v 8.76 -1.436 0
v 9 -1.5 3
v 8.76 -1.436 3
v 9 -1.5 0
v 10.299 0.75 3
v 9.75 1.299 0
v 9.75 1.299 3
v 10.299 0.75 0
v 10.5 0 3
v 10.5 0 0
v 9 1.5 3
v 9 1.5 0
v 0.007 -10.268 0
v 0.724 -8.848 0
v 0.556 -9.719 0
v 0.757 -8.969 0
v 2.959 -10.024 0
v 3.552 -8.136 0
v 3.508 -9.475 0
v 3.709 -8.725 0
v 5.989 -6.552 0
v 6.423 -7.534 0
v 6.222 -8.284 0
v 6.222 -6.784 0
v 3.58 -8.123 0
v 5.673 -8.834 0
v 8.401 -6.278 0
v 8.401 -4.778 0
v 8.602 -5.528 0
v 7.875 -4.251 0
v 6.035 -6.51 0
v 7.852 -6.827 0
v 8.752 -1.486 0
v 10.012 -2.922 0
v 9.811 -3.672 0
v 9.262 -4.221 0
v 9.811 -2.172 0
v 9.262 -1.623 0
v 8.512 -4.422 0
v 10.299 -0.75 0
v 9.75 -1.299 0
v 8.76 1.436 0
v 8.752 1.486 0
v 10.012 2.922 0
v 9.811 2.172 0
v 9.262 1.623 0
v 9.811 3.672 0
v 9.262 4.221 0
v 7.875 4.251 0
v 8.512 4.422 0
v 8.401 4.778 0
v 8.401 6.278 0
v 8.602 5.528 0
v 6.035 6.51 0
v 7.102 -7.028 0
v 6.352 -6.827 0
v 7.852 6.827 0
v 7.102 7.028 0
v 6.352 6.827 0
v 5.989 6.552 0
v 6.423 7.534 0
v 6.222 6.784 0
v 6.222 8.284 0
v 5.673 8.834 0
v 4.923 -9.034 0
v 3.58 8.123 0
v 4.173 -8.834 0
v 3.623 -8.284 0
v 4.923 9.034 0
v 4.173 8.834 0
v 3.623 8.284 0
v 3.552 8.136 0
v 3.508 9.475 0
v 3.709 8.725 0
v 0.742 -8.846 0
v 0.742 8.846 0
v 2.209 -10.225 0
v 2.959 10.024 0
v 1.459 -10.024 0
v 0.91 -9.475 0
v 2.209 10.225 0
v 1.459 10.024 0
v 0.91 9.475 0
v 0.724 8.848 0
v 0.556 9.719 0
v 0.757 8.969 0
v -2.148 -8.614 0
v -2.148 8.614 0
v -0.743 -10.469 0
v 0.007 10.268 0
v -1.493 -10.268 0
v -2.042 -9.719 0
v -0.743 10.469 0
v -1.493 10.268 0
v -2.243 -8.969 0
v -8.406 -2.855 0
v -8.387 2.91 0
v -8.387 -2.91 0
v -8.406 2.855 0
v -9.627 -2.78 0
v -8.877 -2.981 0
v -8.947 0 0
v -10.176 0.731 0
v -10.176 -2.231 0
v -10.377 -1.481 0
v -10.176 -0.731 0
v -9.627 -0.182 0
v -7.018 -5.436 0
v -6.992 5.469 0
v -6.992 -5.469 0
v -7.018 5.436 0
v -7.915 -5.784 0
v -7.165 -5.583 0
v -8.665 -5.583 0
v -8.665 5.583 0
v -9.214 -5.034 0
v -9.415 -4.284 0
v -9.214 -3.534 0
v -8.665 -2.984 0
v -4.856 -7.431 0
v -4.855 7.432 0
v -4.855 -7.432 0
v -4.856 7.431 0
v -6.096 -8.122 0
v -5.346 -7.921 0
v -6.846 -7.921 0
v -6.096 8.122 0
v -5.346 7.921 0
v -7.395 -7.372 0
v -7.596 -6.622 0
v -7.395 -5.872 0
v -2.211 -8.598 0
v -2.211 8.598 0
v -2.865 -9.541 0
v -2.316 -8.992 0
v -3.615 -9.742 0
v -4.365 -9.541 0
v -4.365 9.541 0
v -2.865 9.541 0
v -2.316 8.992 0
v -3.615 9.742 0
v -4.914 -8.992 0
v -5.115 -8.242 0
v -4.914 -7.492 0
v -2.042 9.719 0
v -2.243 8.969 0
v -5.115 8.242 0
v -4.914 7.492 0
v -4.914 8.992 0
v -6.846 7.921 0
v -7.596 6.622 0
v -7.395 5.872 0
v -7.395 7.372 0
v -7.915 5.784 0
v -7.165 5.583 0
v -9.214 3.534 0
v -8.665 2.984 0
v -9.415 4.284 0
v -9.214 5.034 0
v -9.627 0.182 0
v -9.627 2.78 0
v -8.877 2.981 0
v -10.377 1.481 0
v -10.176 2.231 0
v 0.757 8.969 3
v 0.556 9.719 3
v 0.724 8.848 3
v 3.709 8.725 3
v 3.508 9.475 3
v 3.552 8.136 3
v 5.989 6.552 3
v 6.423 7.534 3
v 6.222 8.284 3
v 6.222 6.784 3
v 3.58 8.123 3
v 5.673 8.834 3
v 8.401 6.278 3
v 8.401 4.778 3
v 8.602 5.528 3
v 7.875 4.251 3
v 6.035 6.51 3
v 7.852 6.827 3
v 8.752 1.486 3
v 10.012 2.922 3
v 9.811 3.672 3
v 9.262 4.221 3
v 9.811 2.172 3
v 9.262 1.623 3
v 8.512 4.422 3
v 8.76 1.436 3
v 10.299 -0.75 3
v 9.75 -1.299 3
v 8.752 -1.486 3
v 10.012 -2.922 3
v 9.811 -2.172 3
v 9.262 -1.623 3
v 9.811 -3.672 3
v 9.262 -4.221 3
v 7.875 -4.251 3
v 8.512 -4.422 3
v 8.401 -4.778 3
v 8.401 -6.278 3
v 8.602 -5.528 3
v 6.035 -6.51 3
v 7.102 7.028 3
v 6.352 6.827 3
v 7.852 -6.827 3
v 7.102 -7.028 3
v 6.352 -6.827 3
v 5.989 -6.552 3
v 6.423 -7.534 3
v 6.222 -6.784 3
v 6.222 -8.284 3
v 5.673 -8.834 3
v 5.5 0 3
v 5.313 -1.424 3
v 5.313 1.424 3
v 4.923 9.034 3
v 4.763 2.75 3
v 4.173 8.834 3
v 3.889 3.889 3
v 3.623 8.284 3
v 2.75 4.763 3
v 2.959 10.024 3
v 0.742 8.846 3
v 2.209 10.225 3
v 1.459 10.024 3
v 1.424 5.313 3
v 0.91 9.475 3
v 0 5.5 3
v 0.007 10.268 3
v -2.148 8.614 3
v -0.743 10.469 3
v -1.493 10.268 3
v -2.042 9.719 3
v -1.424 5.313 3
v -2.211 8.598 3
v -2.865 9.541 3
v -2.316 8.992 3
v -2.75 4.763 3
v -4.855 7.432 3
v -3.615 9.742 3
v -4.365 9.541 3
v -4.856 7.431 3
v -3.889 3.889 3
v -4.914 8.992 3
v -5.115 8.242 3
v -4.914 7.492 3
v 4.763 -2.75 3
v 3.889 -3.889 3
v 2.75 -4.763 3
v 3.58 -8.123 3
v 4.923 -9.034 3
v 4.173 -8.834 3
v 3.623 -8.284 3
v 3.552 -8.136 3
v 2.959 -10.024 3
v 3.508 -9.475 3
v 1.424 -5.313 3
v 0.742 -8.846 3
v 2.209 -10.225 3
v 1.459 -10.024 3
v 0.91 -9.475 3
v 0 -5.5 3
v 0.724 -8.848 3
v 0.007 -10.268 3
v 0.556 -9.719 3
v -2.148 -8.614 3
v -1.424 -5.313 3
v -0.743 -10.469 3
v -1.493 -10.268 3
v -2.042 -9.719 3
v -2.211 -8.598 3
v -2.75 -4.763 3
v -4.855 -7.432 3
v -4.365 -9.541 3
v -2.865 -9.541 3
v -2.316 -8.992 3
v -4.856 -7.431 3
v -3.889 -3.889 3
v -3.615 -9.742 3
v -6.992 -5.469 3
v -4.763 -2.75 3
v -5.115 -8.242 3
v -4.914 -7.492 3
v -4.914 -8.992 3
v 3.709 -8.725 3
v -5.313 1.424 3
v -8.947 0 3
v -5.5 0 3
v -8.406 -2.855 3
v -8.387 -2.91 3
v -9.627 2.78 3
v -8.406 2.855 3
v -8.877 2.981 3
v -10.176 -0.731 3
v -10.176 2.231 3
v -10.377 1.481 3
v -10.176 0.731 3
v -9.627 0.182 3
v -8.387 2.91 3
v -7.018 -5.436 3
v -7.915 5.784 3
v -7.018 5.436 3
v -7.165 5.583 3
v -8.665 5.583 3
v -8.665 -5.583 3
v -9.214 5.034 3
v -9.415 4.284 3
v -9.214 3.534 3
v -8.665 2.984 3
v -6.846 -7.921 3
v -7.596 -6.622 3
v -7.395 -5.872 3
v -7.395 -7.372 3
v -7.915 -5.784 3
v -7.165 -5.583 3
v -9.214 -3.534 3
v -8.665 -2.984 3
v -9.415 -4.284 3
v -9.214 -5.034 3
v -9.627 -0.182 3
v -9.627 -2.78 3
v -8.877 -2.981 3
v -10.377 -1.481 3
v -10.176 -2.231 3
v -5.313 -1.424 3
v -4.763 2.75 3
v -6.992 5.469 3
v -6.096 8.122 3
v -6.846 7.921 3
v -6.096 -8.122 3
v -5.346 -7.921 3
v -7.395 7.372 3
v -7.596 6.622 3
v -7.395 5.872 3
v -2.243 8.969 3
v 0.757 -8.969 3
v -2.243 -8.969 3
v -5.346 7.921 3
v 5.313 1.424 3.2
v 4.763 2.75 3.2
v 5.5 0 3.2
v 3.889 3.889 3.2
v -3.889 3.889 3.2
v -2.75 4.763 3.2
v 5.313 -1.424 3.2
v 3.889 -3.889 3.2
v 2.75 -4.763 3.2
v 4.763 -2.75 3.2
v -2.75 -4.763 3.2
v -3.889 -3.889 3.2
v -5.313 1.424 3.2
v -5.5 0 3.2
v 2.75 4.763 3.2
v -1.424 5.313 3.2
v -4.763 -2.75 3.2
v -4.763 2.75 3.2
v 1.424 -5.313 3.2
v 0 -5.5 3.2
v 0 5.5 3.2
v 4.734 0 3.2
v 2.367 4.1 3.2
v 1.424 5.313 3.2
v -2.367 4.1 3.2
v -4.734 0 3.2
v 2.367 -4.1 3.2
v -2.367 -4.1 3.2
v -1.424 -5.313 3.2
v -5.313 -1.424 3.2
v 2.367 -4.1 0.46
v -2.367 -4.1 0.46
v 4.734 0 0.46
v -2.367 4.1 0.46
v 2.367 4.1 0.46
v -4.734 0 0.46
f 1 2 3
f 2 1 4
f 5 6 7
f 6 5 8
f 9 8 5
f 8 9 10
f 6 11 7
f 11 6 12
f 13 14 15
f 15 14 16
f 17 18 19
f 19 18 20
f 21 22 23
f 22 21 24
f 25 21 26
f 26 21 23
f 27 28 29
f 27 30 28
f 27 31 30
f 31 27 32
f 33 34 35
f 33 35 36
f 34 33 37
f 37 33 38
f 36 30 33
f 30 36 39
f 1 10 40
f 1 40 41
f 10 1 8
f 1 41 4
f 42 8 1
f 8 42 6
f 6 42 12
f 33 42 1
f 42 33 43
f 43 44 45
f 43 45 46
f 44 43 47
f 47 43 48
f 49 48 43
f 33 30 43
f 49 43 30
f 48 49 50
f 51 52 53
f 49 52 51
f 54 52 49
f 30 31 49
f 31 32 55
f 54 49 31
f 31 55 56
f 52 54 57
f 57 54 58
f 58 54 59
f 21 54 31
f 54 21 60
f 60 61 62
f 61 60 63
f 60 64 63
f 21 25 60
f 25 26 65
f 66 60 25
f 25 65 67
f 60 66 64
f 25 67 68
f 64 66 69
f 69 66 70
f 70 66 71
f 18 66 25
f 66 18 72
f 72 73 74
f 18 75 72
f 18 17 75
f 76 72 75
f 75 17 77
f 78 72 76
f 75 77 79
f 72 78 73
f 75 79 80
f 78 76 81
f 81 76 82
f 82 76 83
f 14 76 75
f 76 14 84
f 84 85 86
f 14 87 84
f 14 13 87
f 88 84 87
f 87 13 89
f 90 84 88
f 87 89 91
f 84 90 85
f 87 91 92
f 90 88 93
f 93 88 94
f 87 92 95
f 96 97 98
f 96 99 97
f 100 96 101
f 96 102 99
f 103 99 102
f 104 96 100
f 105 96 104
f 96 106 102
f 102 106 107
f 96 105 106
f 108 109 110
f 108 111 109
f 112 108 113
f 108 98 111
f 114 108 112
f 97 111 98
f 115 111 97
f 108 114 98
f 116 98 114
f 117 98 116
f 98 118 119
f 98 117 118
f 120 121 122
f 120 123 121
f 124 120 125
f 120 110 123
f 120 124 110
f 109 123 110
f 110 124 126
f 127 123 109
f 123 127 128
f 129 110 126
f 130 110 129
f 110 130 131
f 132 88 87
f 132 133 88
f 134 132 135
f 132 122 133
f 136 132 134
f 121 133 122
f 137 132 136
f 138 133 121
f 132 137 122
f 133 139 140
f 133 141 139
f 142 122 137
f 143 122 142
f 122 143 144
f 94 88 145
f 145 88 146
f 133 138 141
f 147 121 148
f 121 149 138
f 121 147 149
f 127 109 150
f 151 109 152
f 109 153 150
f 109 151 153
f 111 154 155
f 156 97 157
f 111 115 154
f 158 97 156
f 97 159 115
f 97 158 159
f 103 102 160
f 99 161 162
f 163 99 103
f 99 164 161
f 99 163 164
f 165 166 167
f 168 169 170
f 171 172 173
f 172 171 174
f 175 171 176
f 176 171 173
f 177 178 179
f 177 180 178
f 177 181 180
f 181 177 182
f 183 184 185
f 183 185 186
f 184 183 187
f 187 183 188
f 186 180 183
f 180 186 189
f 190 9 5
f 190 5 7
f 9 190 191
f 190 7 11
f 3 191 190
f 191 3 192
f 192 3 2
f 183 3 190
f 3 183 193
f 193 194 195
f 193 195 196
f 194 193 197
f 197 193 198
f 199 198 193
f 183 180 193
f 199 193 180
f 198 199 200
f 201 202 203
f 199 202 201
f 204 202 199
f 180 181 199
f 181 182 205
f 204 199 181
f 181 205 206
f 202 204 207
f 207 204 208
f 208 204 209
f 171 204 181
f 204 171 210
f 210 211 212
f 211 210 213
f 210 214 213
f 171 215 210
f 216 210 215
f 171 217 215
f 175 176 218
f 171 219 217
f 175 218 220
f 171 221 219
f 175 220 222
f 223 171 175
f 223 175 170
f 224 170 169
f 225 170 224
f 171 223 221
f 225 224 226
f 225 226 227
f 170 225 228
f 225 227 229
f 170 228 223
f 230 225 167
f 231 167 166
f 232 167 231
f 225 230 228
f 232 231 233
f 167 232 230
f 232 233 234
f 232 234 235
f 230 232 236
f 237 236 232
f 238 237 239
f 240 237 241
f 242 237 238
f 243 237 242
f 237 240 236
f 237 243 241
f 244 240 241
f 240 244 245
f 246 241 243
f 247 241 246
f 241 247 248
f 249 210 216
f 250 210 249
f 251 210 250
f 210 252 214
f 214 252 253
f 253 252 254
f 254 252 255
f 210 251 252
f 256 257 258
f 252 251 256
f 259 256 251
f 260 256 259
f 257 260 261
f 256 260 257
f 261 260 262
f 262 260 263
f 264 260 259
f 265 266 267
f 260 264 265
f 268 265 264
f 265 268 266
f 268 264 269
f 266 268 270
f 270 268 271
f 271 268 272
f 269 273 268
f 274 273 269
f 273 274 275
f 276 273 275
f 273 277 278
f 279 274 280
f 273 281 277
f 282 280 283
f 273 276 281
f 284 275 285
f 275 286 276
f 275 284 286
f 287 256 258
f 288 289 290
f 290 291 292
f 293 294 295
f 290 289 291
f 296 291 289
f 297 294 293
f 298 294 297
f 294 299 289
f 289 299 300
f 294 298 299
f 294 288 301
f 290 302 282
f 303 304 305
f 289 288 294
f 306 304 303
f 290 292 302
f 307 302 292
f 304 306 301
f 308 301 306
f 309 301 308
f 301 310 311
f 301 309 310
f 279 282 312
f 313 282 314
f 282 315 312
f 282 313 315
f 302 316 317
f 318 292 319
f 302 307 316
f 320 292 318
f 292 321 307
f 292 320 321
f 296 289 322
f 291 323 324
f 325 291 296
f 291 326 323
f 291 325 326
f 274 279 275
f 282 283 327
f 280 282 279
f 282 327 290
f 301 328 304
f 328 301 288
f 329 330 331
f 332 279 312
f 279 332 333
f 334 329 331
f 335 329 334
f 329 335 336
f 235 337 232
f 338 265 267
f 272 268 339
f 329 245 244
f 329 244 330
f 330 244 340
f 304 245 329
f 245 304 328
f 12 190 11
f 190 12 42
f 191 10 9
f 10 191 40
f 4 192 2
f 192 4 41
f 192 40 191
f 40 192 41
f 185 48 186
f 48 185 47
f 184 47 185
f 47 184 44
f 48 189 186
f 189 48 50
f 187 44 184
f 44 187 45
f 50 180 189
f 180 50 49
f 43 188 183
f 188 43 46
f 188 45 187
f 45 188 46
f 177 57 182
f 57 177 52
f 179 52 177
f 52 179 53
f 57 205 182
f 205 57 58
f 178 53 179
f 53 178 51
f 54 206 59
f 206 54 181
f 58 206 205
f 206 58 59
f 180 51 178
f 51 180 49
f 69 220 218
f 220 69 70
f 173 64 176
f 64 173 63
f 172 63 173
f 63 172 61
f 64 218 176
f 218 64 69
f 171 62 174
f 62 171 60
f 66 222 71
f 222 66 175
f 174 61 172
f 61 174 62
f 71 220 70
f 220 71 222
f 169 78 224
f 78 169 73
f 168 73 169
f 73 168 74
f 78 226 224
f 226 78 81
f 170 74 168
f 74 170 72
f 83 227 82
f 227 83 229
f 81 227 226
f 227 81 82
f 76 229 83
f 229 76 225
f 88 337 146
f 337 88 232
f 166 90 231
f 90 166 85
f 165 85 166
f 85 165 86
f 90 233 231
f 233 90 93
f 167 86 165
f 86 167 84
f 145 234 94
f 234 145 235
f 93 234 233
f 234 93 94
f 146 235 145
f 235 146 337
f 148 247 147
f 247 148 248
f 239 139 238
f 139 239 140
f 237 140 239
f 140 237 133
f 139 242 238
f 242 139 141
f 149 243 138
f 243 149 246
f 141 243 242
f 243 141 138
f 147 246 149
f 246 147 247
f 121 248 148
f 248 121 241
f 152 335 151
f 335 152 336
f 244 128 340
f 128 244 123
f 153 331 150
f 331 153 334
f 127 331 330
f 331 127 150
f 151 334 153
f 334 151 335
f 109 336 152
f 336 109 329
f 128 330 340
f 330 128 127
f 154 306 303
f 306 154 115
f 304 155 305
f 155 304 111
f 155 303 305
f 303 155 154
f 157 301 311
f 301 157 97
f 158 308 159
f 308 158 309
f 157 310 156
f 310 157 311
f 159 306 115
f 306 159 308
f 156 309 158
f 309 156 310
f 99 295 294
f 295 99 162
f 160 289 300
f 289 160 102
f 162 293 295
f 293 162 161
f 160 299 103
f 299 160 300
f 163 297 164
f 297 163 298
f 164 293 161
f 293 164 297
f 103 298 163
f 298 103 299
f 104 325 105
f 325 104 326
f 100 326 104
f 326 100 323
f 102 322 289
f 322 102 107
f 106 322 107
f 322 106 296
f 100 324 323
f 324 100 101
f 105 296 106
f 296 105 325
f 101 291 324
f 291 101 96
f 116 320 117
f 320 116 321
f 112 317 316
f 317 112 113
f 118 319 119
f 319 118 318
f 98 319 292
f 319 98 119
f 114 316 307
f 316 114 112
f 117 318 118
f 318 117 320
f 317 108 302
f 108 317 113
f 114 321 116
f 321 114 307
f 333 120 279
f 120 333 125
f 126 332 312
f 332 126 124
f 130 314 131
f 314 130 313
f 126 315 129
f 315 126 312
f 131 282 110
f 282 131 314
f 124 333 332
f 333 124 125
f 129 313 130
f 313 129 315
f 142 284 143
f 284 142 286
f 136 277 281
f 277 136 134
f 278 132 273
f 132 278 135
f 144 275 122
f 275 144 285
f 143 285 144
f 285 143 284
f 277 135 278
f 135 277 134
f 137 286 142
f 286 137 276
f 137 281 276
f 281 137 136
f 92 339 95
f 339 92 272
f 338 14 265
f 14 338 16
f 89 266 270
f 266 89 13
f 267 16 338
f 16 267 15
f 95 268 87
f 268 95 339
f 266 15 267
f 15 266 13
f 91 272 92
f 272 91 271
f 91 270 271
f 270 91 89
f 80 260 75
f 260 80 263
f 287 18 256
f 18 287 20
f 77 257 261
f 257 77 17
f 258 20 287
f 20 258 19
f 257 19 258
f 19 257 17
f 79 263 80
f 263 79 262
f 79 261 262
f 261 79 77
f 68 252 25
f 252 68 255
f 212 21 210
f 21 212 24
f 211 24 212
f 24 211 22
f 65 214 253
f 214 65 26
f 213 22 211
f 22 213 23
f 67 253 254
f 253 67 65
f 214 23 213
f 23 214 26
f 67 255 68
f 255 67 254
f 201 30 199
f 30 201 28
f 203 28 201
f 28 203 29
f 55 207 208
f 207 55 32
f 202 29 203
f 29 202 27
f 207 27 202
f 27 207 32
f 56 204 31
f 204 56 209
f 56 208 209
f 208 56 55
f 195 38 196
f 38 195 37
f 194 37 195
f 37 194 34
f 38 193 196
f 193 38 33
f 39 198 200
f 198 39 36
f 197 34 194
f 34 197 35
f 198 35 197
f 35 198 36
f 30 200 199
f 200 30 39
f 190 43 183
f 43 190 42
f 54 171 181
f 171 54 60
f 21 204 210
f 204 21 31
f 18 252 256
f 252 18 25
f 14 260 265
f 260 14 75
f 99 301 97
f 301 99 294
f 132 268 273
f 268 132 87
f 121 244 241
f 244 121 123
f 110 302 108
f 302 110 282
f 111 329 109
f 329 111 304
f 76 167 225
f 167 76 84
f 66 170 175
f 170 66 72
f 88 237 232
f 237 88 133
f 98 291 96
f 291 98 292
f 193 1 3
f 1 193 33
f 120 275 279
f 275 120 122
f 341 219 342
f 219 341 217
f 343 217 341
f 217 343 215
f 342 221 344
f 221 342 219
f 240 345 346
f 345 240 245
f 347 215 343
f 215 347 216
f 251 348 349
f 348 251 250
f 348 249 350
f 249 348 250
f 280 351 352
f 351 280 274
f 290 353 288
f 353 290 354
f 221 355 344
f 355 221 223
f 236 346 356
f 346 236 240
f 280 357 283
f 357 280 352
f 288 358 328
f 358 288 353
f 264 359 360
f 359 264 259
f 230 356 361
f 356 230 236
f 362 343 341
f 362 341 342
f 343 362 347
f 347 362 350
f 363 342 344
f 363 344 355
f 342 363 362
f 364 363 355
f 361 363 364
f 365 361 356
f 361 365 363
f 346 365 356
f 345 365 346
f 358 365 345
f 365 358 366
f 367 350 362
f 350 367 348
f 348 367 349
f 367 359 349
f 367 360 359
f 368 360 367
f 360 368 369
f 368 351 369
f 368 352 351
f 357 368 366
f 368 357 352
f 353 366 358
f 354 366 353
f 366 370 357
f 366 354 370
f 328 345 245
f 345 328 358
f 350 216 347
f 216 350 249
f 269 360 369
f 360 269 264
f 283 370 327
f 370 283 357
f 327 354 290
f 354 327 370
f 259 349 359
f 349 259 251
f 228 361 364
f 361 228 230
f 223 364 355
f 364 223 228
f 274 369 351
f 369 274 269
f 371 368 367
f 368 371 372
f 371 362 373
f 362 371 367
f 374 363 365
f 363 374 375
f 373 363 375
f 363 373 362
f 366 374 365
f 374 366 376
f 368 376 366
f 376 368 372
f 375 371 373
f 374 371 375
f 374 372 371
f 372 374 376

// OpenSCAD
height = 3.2;
thick_height = 3;
diameter = 11;
thick_diameter = 18;

hole_diameter_tolerance = 0;
hole_diameter_base_size = 0;
nut_thickness = 2.74;
nut_width_tolerance = 0.35;
nut_width_base_size = 7.85;

module dummy() {}

hole_diameter = hole_diameter_base_size + hole_diameter_tolerance;
nut_width = nut_width_base_size + nut_width_tolerance;

nudge = 0.001;

pi = 3.141592653589793;

module knurledCylinder(h=10,r1=5,r2=1.5) {
    n = ceil(2 * pi * r1 / (2 * r2));
    cylinder(h=h,r=r1,$fn=n);
    for (i=[0:n-1]) {
        x = r1*cos(360./n*i);
        y = r1*sin(360./n*i);
        translate([x,y,0]) cylinder(h=h,r=r2,$fn=12);
    }
}

render(convexity=10)
difference() {
    union() {
        cylinder(h=height,r=diameter/2,$fn=24);
        knurledCylinder(h=thick_height,r1=thick_diameter/2);
    }
    translate([0,0,-nudge]) cylinder(h=height+2*nudge,d=hole_diameter,$fn=12);
    translate([0,0,height-nut_thickness])
    cylinder(h=nut_thickness+nudge,d=nut_width*2/sqrt(3), $fn=6);
}
